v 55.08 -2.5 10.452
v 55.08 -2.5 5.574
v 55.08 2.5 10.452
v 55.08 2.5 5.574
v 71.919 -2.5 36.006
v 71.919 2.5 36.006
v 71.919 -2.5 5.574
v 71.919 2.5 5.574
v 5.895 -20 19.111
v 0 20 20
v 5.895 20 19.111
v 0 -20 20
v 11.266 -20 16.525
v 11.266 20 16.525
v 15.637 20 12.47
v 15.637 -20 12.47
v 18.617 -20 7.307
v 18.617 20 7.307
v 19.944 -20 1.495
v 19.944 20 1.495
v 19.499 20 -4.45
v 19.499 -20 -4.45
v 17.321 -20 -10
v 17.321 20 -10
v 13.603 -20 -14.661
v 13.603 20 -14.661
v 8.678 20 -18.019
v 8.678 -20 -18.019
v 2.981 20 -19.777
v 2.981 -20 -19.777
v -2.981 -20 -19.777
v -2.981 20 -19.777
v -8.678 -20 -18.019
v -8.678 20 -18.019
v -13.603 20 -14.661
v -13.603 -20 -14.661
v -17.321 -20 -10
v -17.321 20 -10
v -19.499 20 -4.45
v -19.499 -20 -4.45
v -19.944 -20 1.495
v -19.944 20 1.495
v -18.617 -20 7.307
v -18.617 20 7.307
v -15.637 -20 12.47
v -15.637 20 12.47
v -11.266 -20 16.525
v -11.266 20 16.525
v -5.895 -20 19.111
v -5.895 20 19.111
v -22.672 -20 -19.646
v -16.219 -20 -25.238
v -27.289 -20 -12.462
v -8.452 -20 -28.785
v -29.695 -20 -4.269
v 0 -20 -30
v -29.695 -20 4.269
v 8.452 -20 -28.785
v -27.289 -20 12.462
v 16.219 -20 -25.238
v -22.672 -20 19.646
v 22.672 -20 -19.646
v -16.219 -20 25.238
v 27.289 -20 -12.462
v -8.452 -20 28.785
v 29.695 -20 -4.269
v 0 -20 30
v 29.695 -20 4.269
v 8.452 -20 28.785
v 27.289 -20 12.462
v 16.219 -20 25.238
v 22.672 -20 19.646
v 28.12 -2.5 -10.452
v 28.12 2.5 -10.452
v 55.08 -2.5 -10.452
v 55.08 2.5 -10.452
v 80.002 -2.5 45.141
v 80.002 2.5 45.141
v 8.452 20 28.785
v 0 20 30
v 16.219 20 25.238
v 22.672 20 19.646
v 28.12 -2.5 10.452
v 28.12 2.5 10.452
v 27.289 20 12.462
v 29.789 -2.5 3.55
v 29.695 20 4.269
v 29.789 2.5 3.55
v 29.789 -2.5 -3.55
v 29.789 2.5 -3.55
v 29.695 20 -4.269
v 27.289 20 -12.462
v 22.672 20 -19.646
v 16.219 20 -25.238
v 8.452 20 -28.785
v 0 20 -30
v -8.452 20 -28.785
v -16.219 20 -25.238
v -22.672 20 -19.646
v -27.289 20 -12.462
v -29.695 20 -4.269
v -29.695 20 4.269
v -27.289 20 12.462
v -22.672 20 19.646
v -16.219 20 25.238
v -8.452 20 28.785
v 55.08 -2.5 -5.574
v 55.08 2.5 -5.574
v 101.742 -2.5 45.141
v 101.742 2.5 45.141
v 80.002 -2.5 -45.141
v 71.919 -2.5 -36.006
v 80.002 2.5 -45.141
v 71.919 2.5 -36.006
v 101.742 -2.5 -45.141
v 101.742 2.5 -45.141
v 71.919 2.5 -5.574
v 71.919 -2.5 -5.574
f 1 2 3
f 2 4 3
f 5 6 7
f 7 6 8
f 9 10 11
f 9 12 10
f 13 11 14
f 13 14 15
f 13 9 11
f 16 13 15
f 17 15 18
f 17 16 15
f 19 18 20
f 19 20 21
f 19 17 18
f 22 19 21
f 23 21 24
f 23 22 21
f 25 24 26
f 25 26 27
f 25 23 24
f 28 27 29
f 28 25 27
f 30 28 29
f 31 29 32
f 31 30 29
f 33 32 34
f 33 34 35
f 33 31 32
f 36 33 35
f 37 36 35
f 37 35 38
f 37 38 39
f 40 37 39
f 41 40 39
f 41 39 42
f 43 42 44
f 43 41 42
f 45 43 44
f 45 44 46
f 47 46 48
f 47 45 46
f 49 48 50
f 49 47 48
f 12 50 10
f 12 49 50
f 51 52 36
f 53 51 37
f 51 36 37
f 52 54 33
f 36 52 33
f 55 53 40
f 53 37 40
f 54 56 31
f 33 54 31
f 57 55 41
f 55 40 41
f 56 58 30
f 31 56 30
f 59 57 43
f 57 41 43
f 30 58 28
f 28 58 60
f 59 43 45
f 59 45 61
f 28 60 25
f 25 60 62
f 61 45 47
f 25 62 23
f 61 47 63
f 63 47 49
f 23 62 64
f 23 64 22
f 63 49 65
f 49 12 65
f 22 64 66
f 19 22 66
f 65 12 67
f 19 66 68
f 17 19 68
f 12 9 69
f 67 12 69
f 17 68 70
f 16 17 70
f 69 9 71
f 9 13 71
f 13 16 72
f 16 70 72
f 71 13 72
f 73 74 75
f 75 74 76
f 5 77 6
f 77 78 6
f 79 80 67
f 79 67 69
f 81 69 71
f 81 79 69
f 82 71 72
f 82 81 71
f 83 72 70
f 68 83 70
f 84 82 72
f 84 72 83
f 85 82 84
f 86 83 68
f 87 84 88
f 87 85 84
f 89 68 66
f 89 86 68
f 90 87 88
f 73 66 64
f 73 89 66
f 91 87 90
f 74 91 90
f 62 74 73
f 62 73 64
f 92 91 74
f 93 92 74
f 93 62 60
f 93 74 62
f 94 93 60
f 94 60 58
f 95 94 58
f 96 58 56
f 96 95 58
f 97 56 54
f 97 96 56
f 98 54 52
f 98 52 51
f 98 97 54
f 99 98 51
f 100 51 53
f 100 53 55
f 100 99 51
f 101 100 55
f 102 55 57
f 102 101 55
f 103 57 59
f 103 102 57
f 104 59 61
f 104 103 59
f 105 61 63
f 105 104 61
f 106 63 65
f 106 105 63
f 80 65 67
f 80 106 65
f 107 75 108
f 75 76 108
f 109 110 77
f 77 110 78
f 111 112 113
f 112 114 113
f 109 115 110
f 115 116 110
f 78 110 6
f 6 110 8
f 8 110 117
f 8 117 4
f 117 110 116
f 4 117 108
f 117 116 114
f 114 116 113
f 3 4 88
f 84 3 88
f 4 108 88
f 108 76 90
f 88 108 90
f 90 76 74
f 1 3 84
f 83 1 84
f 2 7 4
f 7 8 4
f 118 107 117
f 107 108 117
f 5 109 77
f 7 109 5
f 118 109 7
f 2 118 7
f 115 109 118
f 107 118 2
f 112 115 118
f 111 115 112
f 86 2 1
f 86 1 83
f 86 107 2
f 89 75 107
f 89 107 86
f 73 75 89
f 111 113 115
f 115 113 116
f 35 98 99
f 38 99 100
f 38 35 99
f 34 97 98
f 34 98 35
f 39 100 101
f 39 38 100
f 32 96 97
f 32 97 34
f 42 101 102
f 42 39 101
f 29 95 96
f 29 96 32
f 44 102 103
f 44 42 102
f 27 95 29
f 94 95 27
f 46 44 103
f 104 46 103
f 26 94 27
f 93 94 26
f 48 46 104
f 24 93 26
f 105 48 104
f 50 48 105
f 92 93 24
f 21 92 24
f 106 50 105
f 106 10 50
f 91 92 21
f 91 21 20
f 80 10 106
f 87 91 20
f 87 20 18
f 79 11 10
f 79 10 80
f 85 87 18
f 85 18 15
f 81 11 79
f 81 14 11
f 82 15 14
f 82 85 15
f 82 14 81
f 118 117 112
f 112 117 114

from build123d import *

# Parameters (mm, degrees)
SKETCH1_R           = 30
SKETCH1_R_2         = 20
BOSS_EXTRUDE1_DEPTH = 20
BOSS_EXTRUDE2_DEPTH = 2.5


with BuildPart() as part:
    # Sketch1 → Boss-Extrude1 (new, symmetric)
    with BuildSketch(Plane(origin=(0, 0, 0), x_dir=(1, 0, 0), z_dir=(0, 1, 0))):
        with Locations(Location((0, 0, 0), (0, 0, 270))):
            Circle(SKETCH1_R)
        with Locations(Location((0, 0, 0), (0, 0, 270))):
            Circle(SKETCH1_R_2, mode=Mode.SUBTRACT)
    extrude(amount=BOSS_EXTRUDE1_DEPTH, both=True)

    # Sketch2 → Boss-Extrude2 (add, symmetric)
    with BuildSketch(Plane(origin=(0, 0, 0), x_dir=(1, 0, 0), z_dir=(0, 1, 0))):
        with BuildLine():
            Line((28.120382297, 10.451990215), (55.080308758, 10.451990215))
            Line((55.080308758, 10.451990215), (55.080308758, 5.574382734))
            Line((55.080308758, 5.574382734), (71.919231742, 5.574382734))
            Line((71.919231742, 5.574382734), (71.919231742, 36.006171261))
            Line((71.919231742, 36.006171261), (80.002186763, 45.140832286))
            Line((80.002186763, 45.140832286), (101.742384499, 45.140832286))
            Line((101.742384499, 45.140832286), (101.742384499, -45.140832286))
            Line((101.742384499, -45.140832286), (80.002186763, -45.140832286))
            Line((80.002186763, -45.140832286), (71.919231742, -36.006171261))
            Line((71.919231742, -36.006171261), (71.919231742, -5.574382734))
            Line((71.919231742, -5.574382734), (55.080308758, -5.574382734))
            Line((55.080308758, -5.574382734), (55.080308758, -10.451990215))
            Line((55.080308758, -10.451990215), (28.120382297, -10.451990215))
            ThreePointArc((28.120382297, -10.451990215), (30, 0), (28.120382297, 10.451990215))
        make_face()
    extrude(amount=BOSS_EXTRUDE2_DEPTH, both=True)


solid = part.part
